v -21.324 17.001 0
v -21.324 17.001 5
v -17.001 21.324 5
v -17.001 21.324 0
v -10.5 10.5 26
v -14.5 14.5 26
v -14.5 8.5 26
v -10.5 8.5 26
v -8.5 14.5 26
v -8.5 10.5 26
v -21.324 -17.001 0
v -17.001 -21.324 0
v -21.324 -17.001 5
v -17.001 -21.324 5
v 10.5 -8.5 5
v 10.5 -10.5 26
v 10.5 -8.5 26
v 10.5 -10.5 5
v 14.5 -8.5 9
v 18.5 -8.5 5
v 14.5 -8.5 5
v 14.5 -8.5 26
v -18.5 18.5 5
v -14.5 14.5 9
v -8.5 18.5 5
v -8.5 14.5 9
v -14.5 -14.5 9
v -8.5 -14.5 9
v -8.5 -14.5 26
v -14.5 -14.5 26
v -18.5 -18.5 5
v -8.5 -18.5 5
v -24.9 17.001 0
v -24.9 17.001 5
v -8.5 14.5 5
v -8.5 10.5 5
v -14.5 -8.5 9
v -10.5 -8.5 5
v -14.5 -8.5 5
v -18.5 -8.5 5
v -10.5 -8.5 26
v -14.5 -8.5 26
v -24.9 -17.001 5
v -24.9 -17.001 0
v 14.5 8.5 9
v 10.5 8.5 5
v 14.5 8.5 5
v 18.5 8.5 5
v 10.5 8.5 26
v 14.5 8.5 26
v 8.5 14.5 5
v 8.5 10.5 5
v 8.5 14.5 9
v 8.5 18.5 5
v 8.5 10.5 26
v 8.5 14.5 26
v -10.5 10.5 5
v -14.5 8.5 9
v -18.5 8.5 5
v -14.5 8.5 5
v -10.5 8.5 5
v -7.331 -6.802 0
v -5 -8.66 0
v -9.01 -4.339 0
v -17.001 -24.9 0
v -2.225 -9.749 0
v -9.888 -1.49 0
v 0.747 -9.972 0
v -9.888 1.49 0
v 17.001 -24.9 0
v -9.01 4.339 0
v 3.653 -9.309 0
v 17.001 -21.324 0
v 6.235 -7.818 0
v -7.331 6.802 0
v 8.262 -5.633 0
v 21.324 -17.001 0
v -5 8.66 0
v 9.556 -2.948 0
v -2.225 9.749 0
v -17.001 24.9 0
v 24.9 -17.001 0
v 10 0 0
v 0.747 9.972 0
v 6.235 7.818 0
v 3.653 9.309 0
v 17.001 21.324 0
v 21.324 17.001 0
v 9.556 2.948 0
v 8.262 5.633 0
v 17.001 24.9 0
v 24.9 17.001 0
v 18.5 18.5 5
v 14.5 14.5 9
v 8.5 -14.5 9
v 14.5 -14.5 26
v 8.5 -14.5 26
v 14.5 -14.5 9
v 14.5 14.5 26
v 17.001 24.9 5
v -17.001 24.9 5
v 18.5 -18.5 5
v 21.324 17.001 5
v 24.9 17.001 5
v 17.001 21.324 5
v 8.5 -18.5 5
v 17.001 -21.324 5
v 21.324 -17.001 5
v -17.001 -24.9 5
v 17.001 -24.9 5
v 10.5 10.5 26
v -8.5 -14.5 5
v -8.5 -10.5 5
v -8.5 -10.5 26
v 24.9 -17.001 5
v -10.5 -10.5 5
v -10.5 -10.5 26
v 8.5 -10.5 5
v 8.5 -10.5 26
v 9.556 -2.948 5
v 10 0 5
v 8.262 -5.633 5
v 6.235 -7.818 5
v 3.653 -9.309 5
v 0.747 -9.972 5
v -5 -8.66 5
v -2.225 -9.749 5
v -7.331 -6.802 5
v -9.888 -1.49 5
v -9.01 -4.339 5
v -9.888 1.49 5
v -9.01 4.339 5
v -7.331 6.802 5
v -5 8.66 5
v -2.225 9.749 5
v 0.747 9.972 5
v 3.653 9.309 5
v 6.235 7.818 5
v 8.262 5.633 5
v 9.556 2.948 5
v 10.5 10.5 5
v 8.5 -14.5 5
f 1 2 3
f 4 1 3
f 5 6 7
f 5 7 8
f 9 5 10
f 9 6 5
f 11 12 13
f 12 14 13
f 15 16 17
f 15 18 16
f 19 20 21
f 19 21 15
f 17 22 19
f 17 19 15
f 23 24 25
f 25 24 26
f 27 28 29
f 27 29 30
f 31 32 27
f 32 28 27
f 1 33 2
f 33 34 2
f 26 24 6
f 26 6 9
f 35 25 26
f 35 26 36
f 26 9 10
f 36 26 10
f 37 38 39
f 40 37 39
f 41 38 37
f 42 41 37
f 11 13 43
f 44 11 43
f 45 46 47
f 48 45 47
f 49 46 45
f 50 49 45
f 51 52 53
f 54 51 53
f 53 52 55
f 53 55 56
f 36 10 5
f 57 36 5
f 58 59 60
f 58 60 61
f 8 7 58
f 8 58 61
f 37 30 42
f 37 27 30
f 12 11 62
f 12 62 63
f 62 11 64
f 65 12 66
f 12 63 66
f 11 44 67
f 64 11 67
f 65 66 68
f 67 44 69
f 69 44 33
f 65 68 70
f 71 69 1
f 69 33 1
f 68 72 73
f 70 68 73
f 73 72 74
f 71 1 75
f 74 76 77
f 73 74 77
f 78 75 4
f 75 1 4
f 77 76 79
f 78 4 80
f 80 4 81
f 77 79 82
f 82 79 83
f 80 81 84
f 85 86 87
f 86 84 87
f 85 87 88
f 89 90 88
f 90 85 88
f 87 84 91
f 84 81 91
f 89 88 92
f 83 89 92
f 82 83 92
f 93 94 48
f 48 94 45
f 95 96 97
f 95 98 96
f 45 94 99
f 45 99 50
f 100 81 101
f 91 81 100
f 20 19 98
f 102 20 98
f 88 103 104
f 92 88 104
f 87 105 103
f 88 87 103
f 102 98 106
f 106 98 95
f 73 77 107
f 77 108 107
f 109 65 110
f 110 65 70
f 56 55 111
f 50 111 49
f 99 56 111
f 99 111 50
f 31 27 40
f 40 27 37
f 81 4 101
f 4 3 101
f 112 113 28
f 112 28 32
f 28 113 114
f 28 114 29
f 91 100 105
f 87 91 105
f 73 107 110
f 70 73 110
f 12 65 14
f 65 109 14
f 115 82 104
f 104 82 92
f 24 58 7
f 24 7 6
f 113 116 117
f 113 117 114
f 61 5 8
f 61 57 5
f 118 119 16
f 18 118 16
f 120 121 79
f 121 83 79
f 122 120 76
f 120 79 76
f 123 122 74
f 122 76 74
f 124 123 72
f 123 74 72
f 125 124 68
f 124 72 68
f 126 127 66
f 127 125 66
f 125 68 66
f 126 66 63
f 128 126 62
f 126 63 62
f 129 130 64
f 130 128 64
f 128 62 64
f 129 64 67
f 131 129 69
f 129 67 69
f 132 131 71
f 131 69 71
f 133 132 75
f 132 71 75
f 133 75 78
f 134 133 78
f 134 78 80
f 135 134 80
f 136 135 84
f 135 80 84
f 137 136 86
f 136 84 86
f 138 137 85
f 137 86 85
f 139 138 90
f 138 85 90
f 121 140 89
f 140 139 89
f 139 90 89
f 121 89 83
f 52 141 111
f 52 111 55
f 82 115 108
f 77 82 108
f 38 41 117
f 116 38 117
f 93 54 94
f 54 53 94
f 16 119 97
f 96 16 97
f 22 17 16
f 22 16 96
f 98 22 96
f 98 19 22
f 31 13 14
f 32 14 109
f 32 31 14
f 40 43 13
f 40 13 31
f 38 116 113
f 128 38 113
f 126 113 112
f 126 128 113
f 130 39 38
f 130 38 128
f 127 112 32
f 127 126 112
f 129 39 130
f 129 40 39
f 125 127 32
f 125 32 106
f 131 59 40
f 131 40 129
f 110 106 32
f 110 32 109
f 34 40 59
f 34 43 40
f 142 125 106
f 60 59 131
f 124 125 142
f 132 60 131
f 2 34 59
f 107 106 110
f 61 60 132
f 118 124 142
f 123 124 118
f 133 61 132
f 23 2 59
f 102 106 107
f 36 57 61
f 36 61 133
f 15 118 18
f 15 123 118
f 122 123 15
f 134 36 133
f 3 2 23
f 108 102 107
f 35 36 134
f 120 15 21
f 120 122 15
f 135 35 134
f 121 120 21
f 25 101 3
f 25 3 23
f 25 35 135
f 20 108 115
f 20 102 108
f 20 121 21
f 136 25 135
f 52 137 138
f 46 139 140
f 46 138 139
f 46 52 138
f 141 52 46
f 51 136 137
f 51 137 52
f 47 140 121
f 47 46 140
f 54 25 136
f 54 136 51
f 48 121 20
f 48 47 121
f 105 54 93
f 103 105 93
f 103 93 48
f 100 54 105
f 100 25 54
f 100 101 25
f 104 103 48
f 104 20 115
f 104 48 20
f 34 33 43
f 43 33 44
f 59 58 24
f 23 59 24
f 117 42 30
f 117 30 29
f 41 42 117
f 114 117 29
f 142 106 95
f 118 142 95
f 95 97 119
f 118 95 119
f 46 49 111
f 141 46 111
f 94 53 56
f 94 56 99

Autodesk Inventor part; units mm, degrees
ref_plane "YZ Plane" through (0, 0, 0) normal (1, 0, 0) x (0, 1, 0)
ref_plane "XZ Plane" through (0, 0, 0) normal (0, 1, 0) x (-1, 0, 0)
ref_plane "XY Plane" through (0, 0, 0) normal (0, 0, 1) x (1, 0, 0)
sketch "Sketch1" plane through (0, 0, 0) normal (0, 0, 1) x (1, 0, 0)
  line L0 (-34.86, 0) -> (34.86, 0) construction
  line L1 (0, -34.86) -> (0, 34.86) construction
  line L2 (0, 0) -> (16.9726, 16.9726) construction
  line L3 (0, 0) -> (24.0028, 0) construction
  line L4 (0, 24.9) -> (16.8009, 24.9)
  line L5 (16.8009, 24.9) -> (16.8009, 21.2415)
  line L6 (16.8009, 21.2415) -> (19.0212, 19.0212)
  line L7 (24.9, 0) -> (24.9, 16.8009)
  line L8 (24.9, 16.8009) -> (21.2415, 16.8009)
  line L9 (21.2415, 16.8009) -> (19.0212, 19.0212)
  line L10 (0, -24.9) -> (16.8009, -24.9)
  line L11 (16.8009, -24.9) -> (16.8009, -21.2415)
  line L12 (16.8009, -21.2415) -> (19.0212, -19.0212)
  line L13 (24.9, 0) -> (24.9, -16.8009)
  line L14 (24.9, -16.8009) -> (21.2415, -16.8009)
  line L15 (21.2415, -16.8009) -> (19.0212, -19.0212)
  line L16 (0, 0) -> (-16.9726, 16.9726) construction
  line L17 (0, 0) -> (-24.0028, 0) construction
  line L18 (0, 24.9) -> (-16.8009, 24.9)
  line L19 (-16.8009, 24.9) -> (-16.8009, 21.2415)
  line L20 (-16.8009, 21.2415) -> (-19.0212, 19.0212)
  line L21 (-24.9, 0) -> (-24.9, 16.8009)
  line L22 (-24.9, 16.8009) -> (-21.2415, 16.8009)
  line L23 (-21.2415, 16.8009) -> (-19.0212, 19.0212)
  line L24 (0, -24.9) -> (-16.8009, -24.9)
  line L25 (-16.8009, -24.9) -> (-16.8009, -21.2415)
  line L26 (-16.8009, -21.2415) -> (-19.0212, -19.0212)
  line L27 (-21.2415, -16.8009) -> (-19.0212, -19.0212)
  line L28 (-24.9, -16.8009) -> (-21.2415, -16.8009)
  line L29 (-24.9, 0) -> (-24.9, -16.8009)
  circle A0 centre (0, 0) radius 10
  dimension "d17" = 45
  dimension "d18" = 24.9
  dimension "d20" = 3.14
  dimension "d21" = 26.9
  dimension "d22" = 20
extrude "Extrusion1" add sketch "Sketch1" along normal blind 5
sketch "Skizze6" plane through (0, 0, 5) normal (0, 0, 1) x (1, 0, 0)
  circle A0 centre (0, 0) radius 10 construction
  line L0 (16.8009, 24.9) -> (-16.8009, 24.9) construction
  line L1 (-16.8009, 24.9) -> (-16.8009, 21.2415) projected
  line L2 (-16.8009, 21.2415) -> (-21.2415, 16.8009) projected
  line L3 (-21.2415, 16.8009) -> (-24.9, 16.8009) projected
  line L4 (-24.9, 16.8009) -> (-24.9, -16.8009) construction
  line L5 (-24.9, -16.8009) -> (-21.2415, -16.8009) projected
  line L6 (-21.2415, -16.8009) -> (-16.8009, -21.2415) projected
  line L7 (-16.8009, -21.2415) -> (-16.8009, -24.9) projected
  line L8 (-16.8009, -24.9) -> (16.8009, -24.9) construction
  line L9 (16.8009, -24.9) -> (16.8009, -21.2415) projected
  line L10 (16.8009, -21.2415) -> (21.2415, -16.8009) projected
  line L11 (21.2415, -16.8009) -> (24.9, -16.8009) projected
  line L12 (24.9, -16.8009) -> (24.9, 16.8009) construction
  line L13 (24.9, 16.8009) -> (21.2415, 16.8009) projected
  line L14 (21.2415, 16.8009) -> (16.8009, 21.2415) projected
  line L15 (16.8009, 21.2415) -> (16.8009, 24.9) projected
  line L16 (-17.0009, 25.1) -> (17.0009, 25.1) construction
  line L17 (17.0009, 25.1) -> (17.0009, 21.3243)
  line L18 (17.0009, 21.3243) -> (21.3243, 17.0009)
  line L19 (21.3243, 17.0009) -> (25.1, 17.0009)
  line L20 (25.1, 17.0009) -> (25.1, -17.0009) construction
  line L21 (25.1, -17.0009) -> (21.3243, -17.0009)
  line L22 (21.3243, -17.0009) -> (17.0009, -21.3243)
  line L23 (17.0009, -21.3243) -> (17.0009, -25.1)
  line L24 (17.0009, -25.1) -> (-17.0009, -25.1) construction
  line L25 (-17.0009, -25.1) -> (-17.0009, -21.3243)
  line L26 (-17.0009, -21.3243) -> (-21.3243, -17.0009)
  line L27 (-21.3243, -17.0009) -> (-25.1, -17.0009)
  line L28 (-25.1, -17.0009) -> (-25.1, 17.0009) construction
  line L29 (-25.1, 17.0009) -> (-21.3243, 17.0009)
  line L30 (-21.3243, 17.0009) -> (-17.0009, 21.3243)
  line L31 (-17.0009, 21.3243) -> (-17.0009, 25.1)
  line L32 (-24.9, 16.8009) -> (-24.9, 17.0009)
  line L33 (-16.8009, 24.9) -> (-17.0009, 24.9)
  line L34 (16.8009, 24.9) -> (-16.8009, 24.9) projected
  line L35 (16.8009, 24.9) -> (17.0009, 24.9)
  line L36 (24.9, 16.8009) -> (24.9, 17.0009)
  line L37 (16.8009, -24.9) -> (17.0009, -24.9)
  line L38 (21.2415, -16.8009) -> (24.9, -16.8009) projected
  line L39 (24.9, -16.8009) -> (24.9, -17.0009)
  line L40 (-16.8009, -24.9) -> (-17.0009, -24.9)
  line L41 (-24.9, -16.8009) -> (-21.2415, -16.8009) projected
  line L42 (-24.9, -16.8009) -> (-24.9, -17.0009)
  dimension "d17" = 45
  dimension "d18" = 24.9
  dimension "d20" = 3.14
  dimension "d21" = 26.9
  dimension "d41" = 0.2
extrude "IM_offset" add sketch "Skizze6" against normal up to surface (5 mm away)
sketch "Sketch8" plane through (0, 0, 5) normal (0, 0, 1) x (1, 0, 0)
  circle A0 centre (0, 0) radius 10 projected
  line L0 (-10.5, -10.5) -> (10.5, -10.5)
  line L1 (10.5, -10.5) -> (10.5, 10.5)
  line L2 (10.5, 10.5) -> (-10.5, 10.5)
  line L3 (-10.5, 10.5) -> (-10.5, -10.5)
  line L4 (-10.5, -10.5) -> (10.5, 10.5) construction
  line L5 (10.5, -10.5) -> (-10.5, 10.5) construction
  line L6 (-10.5, -10.5) -> (10.5, -10.5) construction
  line L7 (14.5, 14.5) -> (14.5, -14.5)
  line L8 (14.5, -14.5) -> (-14.5, -14.5)
  line L9 (-14.5, -14.5) -> (-14.5, 14.5)
  line L10 (-14.5, 14.5) -> (14.5, 14.5)
  dimension "d48" = 21
  dimension "d49" = 0
  dimension "d50" = 21
  dimension "d51" = 4
extrude "Extrusion8" add sketch "Sketch8" along normal blind 21 contours L7 L8 L9 L10
sketch "Sketch9" plane through (0, 0, 26) normal (0, 0, 1) x (1, 0, 0)
  line L0 (17.0009, 24.9) -> (-17.0009, 24.9) projected
  line L1 (-17.0009, 24.9) -> (-17.0009, 21.3243) projected
  line L2 (-17.0009, 21.3243) -> (-21.3243, 17.0009) projected
  line L3 (-21.3243, 17.0009) -> (-24.9, 17.0009) projected
  line L4 (-24.9, 17.0009) -> (-24.9, -17.0009) projected
  line L5 (-24.9, -17.0009) -> (-21.3243, -17.0009) projected
  line L6 (-21.3243, -17.0009) -> (-17.0009, -21.3243) projected
  line L7 (-17.0009, -21.3243) -> (-17.0009, -24.9) projected
  line L8 (-17.0009, -24.9) -> (17.0009, -24.9) projected
  line L9 (17.0009, -24.9) -> (17.0009, -21.3243) projected
  line L10 (17.0009, -21.3243) -> (21.3243, -17.0009) projected
  line L11 (21.3243, -17.0009) -> (24.9, -17.0009) projected
  line L12 (24.9, -17.0009) -> (24.9, 17.0009) projected
  line L13 (24.9, 17.0009) -> (21.3243, 17.0009) projected
  line L14 (21.3243, 17.0009) -> (17.0009, 21.3243) projected
  line L15 (17.0009, 21.3243) -> (17.0009, 24.9) projected
  line L16 (-14.5, 14.5) -> (14.5, 14.5) projected
  line L17 (14.5, 14.5) -> (14.5, -14.5) projected
  line L18 (14.5, -14.5) -> (-14.5, -14.5) projected
  line L19 (-14.5, -14.5) -> (-14.5, 14.5) projected
  line L20 (24.9, -8.5) -> (-24.9, -8.5)
  line L21 (-24.9, -8.5) -> (-24.9, 8.5)
  line L22 (-24.9, 8.5) -> (24.9, 8.5)
  line L23 (24.9, 8.5) -> (24.9, -8.5)
  line L24 (24.9, -8.5) -> (-24.9, 8.5) construction
  line L25 (-24.9, -8.5) -> (24.9, 8.5) construction
  line L26 (8.5, -24.9) -> (8.5, 24.9)
  line L27 (8.5, 24.9) -> (-8.5, 24.9)
  line L28 (-8.5, 24.9) -> (-8.5, -24.9)
  line L29 (-8.5, -24.9) -> (8.5, -24.9)
  line L30 (8.5, -24.9) -> (-8.5, 24.9) construction
  line L31 (8.5, 24.9) -> (-8.5, -24.9) construction
  point P0 (0, 0)
  point P1 (-8.5, -8.5)
  point P2 (8.5, -8.5)
  point P3 (8.5, 8.5)
  point P4 (-8.5, 8.5)
  dimension "d54" = 17
  dimension "d55" = 17
extrude "Extrusion9" cut sketch "Sketch9" against normal blind 21 contours L26 L16 L28 L0 | L26 L22 L28 L16 | L26 L20 L28 L22 | L22 L17 L20 L26 | L28 L20 L19 L22 | L22 L12 L20 L17 | L26 L18 L28 L20 | L19 L20 L4 L22 | L26 L8 L28 L18
chamfer "Chamfer1" distance 4 angle 45 8 edges at (-11.5, 14.5, 5) (11.5, 14.5, 5) (-14.5, 11.5, 5) (-14.5, -11.5, 5) (-11.5, -14.5, 5) (11.5, -14.5, 5) (14.5, -11.5, 5) (14.5, 11.5, 5)
properties part number "20_Cube_Insert_Beamsplitter_v3"
